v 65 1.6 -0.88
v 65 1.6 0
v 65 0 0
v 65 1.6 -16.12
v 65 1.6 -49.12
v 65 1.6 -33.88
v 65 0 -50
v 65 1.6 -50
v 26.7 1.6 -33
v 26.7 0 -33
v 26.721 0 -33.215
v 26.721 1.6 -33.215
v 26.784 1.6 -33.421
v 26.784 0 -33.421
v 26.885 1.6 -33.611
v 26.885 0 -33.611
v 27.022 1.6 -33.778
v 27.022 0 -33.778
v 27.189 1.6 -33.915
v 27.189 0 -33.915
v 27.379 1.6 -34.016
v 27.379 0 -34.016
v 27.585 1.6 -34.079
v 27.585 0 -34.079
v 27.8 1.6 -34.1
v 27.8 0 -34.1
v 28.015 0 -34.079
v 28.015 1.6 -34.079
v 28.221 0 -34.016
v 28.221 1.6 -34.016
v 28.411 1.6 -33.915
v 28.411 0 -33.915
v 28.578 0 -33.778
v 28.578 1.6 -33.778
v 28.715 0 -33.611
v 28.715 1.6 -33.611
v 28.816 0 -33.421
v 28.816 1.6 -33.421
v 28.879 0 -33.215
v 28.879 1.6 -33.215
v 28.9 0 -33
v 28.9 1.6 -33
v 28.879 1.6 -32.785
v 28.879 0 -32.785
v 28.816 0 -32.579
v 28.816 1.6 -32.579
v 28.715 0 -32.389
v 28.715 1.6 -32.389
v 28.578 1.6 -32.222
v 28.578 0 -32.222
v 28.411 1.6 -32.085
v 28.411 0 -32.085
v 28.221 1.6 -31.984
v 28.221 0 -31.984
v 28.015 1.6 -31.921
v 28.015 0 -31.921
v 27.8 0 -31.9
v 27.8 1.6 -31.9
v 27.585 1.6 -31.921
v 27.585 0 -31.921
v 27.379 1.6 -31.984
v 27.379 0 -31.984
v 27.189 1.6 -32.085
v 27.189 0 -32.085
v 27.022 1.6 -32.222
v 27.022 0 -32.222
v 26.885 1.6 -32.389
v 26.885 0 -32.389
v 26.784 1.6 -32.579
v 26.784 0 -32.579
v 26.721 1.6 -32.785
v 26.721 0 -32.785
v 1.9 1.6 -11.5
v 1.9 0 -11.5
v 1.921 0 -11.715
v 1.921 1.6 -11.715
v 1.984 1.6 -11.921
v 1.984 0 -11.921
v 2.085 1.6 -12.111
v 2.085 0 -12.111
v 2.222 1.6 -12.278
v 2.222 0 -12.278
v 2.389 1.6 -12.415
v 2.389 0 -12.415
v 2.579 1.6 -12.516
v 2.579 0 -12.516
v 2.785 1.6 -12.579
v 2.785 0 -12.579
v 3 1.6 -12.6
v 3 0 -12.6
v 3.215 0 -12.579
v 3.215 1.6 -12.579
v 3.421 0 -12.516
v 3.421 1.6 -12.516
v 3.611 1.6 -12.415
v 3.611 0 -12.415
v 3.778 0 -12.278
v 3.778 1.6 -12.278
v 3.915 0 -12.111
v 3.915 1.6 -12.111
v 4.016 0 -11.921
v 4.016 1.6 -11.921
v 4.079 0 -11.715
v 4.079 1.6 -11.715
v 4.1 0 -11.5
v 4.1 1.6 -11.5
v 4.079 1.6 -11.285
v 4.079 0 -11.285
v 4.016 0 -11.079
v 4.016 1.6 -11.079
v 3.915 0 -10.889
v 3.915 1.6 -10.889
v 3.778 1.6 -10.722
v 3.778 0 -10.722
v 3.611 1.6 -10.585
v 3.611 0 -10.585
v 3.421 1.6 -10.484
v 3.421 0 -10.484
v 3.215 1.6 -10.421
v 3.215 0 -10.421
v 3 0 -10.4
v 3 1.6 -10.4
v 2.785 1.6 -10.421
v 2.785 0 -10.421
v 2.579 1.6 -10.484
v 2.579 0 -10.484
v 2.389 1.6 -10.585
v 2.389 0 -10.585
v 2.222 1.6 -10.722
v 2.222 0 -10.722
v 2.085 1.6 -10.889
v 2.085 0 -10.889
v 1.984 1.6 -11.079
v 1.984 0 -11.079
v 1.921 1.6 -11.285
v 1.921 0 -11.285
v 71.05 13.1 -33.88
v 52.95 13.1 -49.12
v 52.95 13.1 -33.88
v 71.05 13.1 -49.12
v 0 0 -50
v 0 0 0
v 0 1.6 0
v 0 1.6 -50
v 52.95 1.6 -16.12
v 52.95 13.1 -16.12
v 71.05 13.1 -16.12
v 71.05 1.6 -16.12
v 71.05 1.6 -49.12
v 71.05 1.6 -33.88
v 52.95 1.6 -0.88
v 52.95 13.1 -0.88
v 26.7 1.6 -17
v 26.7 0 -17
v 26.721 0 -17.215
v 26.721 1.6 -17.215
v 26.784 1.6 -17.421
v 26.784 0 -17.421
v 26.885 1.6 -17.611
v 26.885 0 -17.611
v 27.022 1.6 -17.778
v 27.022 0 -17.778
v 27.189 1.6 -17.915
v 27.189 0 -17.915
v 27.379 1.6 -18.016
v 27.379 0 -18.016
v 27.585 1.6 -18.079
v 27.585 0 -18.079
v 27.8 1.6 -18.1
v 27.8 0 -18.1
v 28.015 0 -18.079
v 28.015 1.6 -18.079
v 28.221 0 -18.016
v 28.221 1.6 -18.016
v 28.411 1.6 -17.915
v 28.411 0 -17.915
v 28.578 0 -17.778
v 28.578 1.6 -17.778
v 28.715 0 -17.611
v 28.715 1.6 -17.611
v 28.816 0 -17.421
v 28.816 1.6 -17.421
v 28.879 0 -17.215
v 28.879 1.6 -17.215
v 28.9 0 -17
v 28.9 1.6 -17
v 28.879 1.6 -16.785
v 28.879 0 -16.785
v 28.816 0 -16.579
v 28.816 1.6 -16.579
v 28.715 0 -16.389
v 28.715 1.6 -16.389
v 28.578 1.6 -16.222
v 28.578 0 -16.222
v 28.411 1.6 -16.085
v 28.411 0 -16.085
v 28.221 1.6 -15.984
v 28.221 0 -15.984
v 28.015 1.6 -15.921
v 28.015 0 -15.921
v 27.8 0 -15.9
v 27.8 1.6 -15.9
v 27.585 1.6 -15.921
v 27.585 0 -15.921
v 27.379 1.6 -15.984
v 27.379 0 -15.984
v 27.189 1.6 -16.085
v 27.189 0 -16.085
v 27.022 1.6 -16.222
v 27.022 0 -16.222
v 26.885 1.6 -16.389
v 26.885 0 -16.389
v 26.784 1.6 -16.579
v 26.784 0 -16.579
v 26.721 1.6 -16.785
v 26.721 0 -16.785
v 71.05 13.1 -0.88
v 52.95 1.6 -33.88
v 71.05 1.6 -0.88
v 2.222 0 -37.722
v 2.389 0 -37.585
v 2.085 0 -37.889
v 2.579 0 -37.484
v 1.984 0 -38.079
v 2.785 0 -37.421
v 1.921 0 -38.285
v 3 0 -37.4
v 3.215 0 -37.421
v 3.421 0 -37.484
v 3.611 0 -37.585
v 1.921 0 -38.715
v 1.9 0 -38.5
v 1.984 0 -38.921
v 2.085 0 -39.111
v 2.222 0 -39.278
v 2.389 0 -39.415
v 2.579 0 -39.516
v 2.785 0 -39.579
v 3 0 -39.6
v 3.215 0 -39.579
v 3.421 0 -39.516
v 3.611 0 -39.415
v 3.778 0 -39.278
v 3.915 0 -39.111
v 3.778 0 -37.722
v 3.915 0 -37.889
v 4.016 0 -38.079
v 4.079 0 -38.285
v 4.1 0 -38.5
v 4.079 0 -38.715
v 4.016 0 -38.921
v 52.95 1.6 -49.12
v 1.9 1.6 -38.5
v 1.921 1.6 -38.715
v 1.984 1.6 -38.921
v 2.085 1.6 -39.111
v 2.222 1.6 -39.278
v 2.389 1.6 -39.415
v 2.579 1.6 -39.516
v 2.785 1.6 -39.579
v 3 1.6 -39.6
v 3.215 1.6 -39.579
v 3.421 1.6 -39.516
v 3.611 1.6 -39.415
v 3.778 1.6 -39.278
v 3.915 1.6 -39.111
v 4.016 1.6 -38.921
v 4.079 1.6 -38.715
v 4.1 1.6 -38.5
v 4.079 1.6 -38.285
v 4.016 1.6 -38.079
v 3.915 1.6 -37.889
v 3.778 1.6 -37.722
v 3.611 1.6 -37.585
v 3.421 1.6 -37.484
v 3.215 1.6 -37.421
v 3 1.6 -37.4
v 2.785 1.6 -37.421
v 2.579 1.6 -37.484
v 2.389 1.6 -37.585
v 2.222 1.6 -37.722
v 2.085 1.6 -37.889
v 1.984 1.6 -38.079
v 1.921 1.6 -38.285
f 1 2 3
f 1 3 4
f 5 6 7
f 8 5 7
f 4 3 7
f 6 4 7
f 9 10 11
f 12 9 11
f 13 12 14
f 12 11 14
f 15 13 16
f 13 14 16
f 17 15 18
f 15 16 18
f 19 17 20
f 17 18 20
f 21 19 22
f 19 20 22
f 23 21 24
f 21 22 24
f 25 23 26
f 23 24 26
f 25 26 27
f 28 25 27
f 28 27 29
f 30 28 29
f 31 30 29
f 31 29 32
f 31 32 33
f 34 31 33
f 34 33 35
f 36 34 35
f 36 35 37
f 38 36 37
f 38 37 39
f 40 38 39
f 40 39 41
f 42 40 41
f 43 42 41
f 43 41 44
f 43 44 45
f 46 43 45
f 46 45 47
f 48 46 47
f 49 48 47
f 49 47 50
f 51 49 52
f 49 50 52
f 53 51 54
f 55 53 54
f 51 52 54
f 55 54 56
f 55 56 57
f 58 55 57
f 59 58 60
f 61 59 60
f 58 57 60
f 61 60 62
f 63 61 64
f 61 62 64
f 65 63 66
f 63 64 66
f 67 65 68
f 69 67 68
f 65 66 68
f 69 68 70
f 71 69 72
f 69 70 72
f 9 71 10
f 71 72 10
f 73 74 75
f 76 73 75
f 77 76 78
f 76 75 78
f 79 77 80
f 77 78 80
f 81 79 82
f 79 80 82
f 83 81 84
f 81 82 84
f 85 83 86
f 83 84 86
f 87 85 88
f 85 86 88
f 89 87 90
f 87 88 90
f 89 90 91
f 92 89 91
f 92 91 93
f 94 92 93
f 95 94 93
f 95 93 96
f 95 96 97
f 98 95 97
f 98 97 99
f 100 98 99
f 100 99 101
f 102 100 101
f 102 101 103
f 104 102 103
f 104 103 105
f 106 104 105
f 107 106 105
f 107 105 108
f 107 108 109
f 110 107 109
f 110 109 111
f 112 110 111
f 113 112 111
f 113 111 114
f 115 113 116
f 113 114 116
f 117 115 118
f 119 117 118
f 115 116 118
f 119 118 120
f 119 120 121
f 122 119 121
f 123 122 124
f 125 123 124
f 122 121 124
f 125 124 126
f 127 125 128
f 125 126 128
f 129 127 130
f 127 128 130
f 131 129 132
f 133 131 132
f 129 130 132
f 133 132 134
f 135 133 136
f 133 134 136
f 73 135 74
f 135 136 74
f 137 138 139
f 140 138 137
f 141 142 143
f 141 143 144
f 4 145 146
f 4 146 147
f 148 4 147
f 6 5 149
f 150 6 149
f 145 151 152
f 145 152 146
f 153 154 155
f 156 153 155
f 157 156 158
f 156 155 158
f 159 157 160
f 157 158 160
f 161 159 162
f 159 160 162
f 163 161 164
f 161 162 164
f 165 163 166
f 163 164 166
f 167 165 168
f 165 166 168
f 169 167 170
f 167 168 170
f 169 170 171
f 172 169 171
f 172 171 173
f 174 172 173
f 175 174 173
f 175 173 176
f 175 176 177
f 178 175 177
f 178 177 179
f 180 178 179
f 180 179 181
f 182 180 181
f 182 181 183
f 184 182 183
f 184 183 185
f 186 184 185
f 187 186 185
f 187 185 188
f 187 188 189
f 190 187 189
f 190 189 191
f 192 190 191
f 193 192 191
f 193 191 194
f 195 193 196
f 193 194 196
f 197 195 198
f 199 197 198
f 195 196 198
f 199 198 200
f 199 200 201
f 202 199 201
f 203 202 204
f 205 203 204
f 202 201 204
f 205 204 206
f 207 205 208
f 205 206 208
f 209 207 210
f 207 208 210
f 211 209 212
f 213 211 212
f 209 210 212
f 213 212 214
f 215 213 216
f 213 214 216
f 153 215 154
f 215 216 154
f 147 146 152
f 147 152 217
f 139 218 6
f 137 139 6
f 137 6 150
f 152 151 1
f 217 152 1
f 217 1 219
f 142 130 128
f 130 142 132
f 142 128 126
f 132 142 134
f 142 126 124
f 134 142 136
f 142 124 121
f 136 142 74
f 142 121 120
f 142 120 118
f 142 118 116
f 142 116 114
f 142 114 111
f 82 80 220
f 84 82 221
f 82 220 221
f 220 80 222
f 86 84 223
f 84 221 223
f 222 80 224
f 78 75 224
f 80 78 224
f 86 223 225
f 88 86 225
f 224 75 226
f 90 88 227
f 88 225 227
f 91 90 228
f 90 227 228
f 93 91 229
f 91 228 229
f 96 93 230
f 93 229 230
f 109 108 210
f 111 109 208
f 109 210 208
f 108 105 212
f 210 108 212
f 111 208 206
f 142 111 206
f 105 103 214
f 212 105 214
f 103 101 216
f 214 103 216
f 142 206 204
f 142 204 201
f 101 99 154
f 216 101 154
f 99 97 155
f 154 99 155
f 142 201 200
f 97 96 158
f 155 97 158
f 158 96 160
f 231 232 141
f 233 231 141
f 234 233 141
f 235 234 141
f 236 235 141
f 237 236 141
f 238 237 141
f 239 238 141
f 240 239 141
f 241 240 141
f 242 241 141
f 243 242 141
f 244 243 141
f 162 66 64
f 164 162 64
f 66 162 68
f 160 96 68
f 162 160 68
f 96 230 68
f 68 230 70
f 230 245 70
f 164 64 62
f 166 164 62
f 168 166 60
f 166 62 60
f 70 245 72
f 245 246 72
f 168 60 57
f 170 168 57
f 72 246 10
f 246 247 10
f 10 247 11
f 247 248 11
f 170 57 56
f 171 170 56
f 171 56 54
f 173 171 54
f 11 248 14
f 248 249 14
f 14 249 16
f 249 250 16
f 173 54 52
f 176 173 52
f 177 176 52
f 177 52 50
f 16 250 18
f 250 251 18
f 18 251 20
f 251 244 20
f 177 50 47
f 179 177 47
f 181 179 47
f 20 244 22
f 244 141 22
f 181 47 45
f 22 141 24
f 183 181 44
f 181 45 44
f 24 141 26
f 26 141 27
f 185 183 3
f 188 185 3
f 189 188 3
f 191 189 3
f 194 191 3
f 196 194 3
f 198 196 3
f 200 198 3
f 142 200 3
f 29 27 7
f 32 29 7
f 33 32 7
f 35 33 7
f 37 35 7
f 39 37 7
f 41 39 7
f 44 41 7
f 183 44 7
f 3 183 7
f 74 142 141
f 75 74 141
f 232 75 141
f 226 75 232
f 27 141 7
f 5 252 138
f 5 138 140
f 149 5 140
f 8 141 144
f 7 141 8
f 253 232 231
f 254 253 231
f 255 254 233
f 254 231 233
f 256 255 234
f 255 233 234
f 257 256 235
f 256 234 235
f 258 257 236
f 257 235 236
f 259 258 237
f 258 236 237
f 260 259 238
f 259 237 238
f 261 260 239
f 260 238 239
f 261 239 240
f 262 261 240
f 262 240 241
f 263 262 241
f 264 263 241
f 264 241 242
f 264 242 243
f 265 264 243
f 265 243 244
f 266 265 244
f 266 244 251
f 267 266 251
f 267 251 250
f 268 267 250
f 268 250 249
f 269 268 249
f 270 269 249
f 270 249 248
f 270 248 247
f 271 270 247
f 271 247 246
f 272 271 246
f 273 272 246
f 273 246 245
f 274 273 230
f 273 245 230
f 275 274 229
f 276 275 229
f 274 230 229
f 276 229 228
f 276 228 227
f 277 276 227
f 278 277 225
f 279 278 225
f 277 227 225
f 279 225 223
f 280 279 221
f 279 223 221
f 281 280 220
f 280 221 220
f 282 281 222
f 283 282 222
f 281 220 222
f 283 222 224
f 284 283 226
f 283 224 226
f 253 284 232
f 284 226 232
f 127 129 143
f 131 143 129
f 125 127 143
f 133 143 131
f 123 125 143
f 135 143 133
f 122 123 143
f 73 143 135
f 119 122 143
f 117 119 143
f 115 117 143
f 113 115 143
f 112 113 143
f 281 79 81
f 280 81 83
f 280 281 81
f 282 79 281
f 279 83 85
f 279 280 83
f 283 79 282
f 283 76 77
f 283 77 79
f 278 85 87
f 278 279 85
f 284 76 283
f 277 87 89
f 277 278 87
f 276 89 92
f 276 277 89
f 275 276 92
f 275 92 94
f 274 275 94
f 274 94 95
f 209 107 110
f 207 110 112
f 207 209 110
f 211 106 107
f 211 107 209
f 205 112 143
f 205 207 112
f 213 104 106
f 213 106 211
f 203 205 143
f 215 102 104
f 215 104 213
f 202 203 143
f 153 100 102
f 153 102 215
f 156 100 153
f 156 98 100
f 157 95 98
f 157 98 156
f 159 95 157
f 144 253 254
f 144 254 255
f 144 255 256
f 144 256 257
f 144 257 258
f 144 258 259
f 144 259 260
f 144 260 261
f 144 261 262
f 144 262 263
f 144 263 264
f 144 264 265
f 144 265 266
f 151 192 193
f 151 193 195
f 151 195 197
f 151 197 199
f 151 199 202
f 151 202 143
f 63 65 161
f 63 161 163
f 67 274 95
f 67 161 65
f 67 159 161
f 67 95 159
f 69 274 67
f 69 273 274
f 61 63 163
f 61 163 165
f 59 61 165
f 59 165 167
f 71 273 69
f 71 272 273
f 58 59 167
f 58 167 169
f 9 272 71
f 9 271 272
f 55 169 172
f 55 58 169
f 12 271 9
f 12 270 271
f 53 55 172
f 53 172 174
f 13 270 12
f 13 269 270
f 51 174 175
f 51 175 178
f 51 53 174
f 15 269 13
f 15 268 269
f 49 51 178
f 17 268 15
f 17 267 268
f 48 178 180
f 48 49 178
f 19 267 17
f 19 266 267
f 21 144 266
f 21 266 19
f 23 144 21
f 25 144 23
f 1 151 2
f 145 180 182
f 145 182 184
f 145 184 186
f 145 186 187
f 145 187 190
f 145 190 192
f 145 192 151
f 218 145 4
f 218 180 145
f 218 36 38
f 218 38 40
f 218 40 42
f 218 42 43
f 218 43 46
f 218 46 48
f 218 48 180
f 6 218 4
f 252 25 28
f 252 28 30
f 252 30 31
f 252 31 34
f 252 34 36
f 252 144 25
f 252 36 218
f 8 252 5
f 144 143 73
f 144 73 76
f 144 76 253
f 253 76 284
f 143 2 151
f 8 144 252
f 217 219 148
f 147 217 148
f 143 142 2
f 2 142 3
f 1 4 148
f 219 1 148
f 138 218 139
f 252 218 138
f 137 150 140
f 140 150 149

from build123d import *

# Parameters (mm, degrees)
SKETCH1_W             = 65
SKETCH1_H             = 50
BOSS_EXTRUDE1_DEPTH   = 1.6002
F_2_5MM_DOWEL_HOLE1_D = 2.2
SKETCH4_W             = 18.1
SKETCH4_H             = 15.24
BOSS_EXTRUDE2_DEPTH   = 11.5


with BuildPart() as part:
    # Sketch1 → Boss-Extrude1 (new body)
    with BuildSketch(Plane(origin=(0, 0, 0), x_dir=(1, 0, 0), z_dir=(0, 1, 0))):
        with Locations((32.5, 25)):
            Rectangle(SKETCH1_W, SKETCH1_H)
    extrude(amount=BOSS_EXTRUDE1_DEPTH)

    # Ø2.5mm Dowel Hole1 (through all)
    with Locations(Plane(origin=(0, 1.6002, 0), x_dir=(1, 0, 0), z_dir=(0, 1, 0))):
        with Locations((3, 11.5), (3, 38.5), (27.8, 17), (27.8, 33)):
            Hole(F_2_5MM_DOWEL_HOLE1_D / 2)

    # Sketch4 → Boss-Extrude2 (add)
    with BuildSketch(Plane(origin=(0, 1.6002, 0), x_dir=(1, 0, 0), z_dir=(0, 1, 0))):
        with Locations((62, 41.5)):
            Rectangle(SKETCH4_W, SKETCH4_H)
        with Locations((62, 8.5)):
            Rectangle(SKETCH4_W, SKETCH4_H)
    extrude(amount=BOSS_EXTRUDE2_DEPTH)


solid = part.part
